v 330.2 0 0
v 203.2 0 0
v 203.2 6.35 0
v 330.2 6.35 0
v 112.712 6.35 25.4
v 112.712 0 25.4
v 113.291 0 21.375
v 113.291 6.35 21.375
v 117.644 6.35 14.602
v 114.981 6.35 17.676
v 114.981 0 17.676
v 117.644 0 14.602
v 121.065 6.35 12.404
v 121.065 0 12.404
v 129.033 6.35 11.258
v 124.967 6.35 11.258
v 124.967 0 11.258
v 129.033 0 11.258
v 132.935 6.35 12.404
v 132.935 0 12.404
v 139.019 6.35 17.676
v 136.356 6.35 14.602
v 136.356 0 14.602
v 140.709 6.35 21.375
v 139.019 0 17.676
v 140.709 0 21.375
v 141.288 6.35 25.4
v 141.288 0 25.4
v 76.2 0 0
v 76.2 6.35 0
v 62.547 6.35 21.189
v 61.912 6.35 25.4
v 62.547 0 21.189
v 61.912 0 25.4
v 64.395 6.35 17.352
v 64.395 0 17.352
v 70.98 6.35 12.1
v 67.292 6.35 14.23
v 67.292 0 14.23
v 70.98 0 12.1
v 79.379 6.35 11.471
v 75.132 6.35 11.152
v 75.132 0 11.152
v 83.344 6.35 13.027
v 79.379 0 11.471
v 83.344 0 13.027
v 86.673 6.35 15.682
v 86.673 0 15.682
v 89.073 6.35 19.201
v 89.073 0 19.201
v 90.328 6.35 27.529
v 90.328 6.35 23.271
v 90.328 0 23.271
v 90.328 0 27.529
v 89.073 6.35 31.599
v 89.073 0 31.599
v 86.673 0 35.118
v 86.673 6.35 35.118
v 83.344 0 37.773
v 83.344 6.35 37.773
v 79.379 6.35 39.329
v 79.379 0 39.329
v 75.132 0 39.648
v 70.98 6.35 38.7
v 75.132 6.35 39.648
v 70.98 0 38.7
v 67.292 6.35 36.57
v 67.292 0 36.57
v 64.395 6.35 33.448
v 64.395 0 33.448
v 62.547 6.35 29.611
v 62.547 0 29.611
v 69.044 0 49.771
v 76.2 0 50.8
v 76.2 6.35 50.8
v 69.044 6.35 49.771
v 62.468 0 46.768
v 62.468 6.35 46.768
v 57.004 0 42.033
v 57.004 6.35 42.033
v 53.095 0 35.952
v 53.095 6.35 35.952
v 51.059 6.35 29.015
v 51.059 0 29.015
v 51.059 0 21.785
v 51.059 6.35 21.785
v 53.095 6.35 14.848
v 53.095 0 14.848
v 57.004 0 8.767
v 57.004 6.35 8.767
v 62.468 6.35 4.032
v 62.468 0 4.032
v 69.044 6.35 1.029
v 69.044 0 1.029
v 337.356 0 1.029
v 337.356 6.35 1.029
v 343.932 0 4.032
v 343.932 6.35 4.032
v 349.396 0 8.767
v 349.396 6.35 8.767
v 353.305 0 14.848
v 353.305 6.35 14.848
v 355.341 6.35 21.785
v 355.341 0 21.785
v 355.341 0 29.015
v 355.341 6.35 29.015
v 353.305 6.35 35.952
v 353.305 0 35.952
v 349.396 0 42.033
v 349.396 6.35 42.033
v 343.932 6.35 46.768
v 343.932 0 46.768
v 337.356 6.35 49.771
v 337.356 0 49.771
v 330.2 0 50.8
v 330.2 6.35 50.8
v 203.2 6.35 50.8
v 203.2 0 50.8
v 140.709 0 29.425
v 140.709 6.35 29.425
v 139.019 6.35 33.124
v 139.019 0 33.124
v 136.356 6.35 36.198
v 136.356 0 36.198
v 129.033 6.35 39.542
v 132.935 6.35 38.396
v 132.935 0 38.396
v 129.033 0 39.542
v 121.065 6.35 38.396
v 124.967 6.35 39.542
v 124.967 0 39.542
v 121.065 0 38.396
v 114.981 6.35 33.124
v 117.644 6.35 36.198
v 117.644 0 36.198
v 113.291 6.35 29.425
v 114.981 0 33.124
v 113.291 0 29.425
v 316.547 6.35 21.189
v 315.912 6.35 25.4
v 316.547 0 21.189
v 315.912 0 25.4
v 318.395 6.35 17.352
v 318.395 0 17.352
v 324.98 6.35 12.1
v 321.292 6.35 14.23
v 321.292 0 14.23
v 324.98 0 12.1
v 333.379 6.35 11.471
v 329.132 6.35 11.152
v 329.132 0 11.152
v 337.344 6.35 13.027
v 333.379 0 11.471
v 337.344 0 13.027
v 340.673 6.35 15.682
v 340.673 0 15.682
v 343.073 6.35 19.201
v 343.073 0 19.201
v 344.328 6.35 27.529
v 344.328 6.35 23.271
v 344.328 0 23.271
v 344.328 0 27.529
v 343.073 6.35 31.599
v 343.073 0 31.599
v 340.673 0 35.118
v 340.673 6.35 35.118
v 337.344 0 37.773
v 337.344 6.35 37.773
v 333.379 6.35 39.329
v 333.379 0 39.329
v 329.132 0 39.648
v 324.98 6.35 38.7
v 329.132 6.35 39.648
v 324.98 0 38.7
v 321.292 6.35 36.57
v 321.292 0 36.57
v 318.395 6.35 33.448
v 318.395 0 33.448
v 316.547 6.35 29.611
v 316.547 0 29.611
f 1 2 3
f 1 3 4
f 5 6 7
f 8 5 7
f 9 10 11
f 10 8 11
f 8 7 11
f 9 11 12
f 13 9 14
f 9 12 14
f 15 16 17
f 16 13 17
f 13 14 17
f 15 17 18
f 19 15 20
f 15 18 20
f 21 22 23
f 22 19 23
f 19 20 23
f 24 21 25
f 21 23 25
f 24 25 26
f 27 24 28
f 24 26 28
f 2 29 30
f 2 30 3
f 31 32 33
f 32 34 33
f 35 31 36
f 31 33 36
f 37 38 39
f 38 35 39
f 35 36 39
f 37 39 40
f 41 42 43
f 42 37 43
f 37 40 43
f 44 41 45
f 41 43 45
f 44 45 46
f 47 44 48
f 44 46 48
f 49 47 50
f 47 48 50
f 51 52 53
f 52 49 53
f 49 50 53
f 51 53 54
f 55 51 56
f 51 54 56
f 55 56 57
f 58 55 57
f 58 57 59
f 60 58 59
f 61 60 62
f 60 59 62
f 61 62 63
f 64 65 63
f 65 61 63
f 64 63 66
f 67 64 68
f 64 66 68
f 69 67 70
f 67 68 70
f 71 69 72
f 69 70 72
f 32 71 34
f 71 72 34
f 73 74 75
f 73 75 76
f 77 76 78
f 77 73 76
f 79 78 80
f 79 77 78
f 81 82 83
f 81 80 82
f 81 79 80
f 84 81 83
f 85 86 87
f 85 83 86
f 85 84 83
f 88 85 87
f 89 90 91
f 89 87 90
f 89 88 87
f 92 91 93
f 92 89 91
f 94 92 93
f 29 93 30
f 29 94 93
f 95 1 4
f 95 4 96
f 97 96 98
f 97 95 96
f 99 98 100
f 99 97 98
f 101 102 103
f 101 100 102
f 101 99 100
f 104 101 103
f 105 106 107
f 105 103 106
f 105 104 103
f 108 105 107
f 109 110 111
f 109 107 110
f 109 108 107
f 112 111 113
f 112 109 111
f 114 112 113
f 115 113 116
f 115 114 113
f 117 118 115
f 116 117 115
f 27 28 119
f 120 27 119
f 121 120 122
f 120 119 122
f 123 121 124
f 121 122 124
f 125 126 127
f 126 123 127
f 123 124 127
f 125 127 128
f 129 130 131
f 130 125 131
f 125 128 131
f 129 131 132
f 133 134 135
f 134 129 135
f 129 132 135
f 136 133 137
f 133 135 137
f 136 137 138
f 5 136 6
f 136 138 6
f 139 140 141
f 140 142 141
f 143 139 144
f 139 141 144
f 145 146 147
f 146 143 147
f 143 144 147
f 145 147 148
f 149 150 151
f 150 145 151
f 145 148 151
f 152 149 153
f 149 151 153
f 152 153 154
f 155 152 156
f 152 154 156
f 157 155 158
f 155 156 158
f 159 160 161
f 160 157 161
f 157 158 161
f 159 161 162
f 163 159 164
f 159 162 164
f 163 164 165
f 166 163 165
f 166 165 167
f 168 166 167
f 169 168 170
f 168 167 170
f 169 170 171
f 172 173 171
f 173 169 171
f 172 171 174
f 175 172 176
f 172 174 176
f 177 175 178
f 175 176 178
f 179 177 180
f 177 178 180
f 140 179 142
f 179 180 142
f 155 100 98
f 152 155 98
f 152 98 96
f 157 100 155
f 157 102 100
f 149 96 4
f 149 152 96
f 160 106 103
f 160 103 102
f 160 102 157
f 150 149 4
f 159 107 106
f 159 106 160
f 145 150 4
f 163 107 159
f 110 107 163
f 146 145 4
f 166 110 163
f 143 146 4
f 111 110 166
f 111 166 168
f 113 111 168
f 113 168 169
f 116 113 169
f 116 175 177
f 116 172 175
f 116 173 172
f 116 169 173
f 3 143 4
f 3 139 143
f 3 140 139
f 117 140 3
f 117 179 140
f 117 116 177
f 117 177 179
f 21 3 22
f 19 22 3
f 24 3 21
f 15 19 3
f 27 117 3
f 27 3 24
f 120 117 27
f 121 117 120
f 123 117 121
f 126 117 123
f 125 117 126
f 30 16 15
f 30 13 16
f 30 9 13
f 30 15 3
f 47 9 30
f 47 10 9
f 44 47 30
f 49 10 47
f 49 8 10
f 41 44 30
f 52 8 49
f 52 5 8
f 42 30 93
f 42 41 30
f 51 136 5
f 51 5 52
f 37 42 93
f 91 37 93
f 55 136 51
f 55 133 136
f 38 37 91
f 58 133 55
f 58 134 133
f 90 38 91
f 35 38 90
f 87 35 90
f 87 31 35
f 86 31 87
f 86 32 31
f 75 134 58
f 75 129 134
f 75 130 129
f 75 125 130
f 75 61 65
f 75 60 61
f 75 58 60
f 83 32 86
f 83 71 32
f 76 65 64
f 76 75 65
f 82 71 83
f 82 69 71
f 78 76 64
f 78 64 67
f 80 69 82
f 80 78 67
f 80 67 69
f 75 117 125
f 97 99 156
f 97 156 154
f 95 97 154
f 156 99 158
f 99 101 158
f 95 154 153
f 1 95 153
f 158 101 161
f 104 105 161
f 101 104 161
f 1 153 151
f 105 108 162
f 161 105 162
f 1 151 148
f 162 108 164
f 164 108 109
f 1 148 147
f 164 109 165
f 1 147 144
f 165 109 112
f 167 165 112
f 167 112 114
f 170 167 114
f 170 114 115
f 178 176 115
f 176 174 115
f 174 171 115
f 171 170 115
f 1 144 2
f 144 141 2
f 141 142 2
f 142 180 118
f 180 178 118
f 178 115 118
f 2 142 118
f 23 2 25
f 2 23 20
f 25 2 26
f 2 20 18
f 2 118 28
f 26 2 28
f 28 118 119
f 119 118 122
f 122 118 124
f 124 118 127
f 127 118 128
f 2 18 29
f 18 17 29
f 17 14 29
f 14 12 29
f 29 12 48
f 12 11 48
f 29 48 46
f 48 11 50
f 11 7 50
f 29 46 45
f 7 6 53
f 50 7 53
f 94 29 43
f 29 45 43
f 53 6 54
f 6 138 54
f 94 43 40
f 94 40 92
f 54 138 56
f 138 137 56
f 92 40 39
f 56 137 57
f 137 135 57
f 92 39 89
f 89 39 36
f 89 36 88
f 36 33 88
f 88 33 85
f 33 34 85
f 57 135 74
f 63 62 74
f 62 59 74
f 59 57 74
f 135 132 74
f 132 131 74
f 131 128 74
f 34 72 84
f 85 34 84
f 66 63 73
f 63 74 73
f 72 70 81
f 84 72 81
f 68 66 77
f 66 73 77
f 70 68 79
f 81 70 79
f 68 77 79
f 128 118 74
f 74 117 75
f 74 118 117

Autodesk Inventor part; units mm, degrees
ref_plane "YZ Plane" through (0, 0, 0) normal (1, 0, 0) x (0, 1, 0)
ref_plane "XZ Plane" through (0, 0, 0) normal (0, 1, 0) x (-1, 0, 0)
ref_plane "XY Plane" through (0, 0, 0) normal (0, 0, 1) x (1, 0, 0)
sketch "Sketch1" plane through (0, 0, 0) normal (0, 1, 0) x (-1, 0, 0)
  line L0 (0, 0) -> (-203.2, 0)
  line L1 (0, 25.4) -> (-76.2, 25.4) construction
  line L2 (-203.2, 25.4) -> (-127, 25.4) construction
  line L3 (-127, 25.4) -> (-330.2, 25.4)
  line L4 (0, 0) -> (-203.2, 0)
  line L5 (-203.2, 50.8) -> (0, 50.8)
  line L6 (-203.2, 0) -> (-330.2, 0)
  line L7 (-203.2, 50.8) -> (-330.2, 50.8)
  arc A0 (-330.2, 50.8) -> (-330.2, 0) centre (-330.2, 25.4) ccw
  arc A1 (0, 0) -> (0, 50.8) centre (0, 25.4) ccw
  arc A2 (-76.2, 0) -> (-76.2, 50.8) centre (-76.2, 25.4) ccw
  circle A3 centre (-330.2, 25.4) radius 14.2875
  circle A4 centre (-127, 25.4) radius 14.2875
  circle A5 centre (-76.2, 25.4) radius 14.2875
  point P0 (-331.4575, 38.0376)
  point P1 (-331.4575, 12.7624)
  point P2 (-76.2, 0)
  dimension "d2" = 76.2
  dimension "d3" = 76.2
  dimension "d8" = 203.2
  dimension "d12" = 50.8
  dimension "d17" = 28.575
  dimension "d18" = 28.575
  dimension "d19" = 28.575
extrude "Extrusion1" add sketch "Sketch1" along normal blind 6.35 contours L0 L6 A0 L7 L5 A2
properties part number "4-bar intake block"
